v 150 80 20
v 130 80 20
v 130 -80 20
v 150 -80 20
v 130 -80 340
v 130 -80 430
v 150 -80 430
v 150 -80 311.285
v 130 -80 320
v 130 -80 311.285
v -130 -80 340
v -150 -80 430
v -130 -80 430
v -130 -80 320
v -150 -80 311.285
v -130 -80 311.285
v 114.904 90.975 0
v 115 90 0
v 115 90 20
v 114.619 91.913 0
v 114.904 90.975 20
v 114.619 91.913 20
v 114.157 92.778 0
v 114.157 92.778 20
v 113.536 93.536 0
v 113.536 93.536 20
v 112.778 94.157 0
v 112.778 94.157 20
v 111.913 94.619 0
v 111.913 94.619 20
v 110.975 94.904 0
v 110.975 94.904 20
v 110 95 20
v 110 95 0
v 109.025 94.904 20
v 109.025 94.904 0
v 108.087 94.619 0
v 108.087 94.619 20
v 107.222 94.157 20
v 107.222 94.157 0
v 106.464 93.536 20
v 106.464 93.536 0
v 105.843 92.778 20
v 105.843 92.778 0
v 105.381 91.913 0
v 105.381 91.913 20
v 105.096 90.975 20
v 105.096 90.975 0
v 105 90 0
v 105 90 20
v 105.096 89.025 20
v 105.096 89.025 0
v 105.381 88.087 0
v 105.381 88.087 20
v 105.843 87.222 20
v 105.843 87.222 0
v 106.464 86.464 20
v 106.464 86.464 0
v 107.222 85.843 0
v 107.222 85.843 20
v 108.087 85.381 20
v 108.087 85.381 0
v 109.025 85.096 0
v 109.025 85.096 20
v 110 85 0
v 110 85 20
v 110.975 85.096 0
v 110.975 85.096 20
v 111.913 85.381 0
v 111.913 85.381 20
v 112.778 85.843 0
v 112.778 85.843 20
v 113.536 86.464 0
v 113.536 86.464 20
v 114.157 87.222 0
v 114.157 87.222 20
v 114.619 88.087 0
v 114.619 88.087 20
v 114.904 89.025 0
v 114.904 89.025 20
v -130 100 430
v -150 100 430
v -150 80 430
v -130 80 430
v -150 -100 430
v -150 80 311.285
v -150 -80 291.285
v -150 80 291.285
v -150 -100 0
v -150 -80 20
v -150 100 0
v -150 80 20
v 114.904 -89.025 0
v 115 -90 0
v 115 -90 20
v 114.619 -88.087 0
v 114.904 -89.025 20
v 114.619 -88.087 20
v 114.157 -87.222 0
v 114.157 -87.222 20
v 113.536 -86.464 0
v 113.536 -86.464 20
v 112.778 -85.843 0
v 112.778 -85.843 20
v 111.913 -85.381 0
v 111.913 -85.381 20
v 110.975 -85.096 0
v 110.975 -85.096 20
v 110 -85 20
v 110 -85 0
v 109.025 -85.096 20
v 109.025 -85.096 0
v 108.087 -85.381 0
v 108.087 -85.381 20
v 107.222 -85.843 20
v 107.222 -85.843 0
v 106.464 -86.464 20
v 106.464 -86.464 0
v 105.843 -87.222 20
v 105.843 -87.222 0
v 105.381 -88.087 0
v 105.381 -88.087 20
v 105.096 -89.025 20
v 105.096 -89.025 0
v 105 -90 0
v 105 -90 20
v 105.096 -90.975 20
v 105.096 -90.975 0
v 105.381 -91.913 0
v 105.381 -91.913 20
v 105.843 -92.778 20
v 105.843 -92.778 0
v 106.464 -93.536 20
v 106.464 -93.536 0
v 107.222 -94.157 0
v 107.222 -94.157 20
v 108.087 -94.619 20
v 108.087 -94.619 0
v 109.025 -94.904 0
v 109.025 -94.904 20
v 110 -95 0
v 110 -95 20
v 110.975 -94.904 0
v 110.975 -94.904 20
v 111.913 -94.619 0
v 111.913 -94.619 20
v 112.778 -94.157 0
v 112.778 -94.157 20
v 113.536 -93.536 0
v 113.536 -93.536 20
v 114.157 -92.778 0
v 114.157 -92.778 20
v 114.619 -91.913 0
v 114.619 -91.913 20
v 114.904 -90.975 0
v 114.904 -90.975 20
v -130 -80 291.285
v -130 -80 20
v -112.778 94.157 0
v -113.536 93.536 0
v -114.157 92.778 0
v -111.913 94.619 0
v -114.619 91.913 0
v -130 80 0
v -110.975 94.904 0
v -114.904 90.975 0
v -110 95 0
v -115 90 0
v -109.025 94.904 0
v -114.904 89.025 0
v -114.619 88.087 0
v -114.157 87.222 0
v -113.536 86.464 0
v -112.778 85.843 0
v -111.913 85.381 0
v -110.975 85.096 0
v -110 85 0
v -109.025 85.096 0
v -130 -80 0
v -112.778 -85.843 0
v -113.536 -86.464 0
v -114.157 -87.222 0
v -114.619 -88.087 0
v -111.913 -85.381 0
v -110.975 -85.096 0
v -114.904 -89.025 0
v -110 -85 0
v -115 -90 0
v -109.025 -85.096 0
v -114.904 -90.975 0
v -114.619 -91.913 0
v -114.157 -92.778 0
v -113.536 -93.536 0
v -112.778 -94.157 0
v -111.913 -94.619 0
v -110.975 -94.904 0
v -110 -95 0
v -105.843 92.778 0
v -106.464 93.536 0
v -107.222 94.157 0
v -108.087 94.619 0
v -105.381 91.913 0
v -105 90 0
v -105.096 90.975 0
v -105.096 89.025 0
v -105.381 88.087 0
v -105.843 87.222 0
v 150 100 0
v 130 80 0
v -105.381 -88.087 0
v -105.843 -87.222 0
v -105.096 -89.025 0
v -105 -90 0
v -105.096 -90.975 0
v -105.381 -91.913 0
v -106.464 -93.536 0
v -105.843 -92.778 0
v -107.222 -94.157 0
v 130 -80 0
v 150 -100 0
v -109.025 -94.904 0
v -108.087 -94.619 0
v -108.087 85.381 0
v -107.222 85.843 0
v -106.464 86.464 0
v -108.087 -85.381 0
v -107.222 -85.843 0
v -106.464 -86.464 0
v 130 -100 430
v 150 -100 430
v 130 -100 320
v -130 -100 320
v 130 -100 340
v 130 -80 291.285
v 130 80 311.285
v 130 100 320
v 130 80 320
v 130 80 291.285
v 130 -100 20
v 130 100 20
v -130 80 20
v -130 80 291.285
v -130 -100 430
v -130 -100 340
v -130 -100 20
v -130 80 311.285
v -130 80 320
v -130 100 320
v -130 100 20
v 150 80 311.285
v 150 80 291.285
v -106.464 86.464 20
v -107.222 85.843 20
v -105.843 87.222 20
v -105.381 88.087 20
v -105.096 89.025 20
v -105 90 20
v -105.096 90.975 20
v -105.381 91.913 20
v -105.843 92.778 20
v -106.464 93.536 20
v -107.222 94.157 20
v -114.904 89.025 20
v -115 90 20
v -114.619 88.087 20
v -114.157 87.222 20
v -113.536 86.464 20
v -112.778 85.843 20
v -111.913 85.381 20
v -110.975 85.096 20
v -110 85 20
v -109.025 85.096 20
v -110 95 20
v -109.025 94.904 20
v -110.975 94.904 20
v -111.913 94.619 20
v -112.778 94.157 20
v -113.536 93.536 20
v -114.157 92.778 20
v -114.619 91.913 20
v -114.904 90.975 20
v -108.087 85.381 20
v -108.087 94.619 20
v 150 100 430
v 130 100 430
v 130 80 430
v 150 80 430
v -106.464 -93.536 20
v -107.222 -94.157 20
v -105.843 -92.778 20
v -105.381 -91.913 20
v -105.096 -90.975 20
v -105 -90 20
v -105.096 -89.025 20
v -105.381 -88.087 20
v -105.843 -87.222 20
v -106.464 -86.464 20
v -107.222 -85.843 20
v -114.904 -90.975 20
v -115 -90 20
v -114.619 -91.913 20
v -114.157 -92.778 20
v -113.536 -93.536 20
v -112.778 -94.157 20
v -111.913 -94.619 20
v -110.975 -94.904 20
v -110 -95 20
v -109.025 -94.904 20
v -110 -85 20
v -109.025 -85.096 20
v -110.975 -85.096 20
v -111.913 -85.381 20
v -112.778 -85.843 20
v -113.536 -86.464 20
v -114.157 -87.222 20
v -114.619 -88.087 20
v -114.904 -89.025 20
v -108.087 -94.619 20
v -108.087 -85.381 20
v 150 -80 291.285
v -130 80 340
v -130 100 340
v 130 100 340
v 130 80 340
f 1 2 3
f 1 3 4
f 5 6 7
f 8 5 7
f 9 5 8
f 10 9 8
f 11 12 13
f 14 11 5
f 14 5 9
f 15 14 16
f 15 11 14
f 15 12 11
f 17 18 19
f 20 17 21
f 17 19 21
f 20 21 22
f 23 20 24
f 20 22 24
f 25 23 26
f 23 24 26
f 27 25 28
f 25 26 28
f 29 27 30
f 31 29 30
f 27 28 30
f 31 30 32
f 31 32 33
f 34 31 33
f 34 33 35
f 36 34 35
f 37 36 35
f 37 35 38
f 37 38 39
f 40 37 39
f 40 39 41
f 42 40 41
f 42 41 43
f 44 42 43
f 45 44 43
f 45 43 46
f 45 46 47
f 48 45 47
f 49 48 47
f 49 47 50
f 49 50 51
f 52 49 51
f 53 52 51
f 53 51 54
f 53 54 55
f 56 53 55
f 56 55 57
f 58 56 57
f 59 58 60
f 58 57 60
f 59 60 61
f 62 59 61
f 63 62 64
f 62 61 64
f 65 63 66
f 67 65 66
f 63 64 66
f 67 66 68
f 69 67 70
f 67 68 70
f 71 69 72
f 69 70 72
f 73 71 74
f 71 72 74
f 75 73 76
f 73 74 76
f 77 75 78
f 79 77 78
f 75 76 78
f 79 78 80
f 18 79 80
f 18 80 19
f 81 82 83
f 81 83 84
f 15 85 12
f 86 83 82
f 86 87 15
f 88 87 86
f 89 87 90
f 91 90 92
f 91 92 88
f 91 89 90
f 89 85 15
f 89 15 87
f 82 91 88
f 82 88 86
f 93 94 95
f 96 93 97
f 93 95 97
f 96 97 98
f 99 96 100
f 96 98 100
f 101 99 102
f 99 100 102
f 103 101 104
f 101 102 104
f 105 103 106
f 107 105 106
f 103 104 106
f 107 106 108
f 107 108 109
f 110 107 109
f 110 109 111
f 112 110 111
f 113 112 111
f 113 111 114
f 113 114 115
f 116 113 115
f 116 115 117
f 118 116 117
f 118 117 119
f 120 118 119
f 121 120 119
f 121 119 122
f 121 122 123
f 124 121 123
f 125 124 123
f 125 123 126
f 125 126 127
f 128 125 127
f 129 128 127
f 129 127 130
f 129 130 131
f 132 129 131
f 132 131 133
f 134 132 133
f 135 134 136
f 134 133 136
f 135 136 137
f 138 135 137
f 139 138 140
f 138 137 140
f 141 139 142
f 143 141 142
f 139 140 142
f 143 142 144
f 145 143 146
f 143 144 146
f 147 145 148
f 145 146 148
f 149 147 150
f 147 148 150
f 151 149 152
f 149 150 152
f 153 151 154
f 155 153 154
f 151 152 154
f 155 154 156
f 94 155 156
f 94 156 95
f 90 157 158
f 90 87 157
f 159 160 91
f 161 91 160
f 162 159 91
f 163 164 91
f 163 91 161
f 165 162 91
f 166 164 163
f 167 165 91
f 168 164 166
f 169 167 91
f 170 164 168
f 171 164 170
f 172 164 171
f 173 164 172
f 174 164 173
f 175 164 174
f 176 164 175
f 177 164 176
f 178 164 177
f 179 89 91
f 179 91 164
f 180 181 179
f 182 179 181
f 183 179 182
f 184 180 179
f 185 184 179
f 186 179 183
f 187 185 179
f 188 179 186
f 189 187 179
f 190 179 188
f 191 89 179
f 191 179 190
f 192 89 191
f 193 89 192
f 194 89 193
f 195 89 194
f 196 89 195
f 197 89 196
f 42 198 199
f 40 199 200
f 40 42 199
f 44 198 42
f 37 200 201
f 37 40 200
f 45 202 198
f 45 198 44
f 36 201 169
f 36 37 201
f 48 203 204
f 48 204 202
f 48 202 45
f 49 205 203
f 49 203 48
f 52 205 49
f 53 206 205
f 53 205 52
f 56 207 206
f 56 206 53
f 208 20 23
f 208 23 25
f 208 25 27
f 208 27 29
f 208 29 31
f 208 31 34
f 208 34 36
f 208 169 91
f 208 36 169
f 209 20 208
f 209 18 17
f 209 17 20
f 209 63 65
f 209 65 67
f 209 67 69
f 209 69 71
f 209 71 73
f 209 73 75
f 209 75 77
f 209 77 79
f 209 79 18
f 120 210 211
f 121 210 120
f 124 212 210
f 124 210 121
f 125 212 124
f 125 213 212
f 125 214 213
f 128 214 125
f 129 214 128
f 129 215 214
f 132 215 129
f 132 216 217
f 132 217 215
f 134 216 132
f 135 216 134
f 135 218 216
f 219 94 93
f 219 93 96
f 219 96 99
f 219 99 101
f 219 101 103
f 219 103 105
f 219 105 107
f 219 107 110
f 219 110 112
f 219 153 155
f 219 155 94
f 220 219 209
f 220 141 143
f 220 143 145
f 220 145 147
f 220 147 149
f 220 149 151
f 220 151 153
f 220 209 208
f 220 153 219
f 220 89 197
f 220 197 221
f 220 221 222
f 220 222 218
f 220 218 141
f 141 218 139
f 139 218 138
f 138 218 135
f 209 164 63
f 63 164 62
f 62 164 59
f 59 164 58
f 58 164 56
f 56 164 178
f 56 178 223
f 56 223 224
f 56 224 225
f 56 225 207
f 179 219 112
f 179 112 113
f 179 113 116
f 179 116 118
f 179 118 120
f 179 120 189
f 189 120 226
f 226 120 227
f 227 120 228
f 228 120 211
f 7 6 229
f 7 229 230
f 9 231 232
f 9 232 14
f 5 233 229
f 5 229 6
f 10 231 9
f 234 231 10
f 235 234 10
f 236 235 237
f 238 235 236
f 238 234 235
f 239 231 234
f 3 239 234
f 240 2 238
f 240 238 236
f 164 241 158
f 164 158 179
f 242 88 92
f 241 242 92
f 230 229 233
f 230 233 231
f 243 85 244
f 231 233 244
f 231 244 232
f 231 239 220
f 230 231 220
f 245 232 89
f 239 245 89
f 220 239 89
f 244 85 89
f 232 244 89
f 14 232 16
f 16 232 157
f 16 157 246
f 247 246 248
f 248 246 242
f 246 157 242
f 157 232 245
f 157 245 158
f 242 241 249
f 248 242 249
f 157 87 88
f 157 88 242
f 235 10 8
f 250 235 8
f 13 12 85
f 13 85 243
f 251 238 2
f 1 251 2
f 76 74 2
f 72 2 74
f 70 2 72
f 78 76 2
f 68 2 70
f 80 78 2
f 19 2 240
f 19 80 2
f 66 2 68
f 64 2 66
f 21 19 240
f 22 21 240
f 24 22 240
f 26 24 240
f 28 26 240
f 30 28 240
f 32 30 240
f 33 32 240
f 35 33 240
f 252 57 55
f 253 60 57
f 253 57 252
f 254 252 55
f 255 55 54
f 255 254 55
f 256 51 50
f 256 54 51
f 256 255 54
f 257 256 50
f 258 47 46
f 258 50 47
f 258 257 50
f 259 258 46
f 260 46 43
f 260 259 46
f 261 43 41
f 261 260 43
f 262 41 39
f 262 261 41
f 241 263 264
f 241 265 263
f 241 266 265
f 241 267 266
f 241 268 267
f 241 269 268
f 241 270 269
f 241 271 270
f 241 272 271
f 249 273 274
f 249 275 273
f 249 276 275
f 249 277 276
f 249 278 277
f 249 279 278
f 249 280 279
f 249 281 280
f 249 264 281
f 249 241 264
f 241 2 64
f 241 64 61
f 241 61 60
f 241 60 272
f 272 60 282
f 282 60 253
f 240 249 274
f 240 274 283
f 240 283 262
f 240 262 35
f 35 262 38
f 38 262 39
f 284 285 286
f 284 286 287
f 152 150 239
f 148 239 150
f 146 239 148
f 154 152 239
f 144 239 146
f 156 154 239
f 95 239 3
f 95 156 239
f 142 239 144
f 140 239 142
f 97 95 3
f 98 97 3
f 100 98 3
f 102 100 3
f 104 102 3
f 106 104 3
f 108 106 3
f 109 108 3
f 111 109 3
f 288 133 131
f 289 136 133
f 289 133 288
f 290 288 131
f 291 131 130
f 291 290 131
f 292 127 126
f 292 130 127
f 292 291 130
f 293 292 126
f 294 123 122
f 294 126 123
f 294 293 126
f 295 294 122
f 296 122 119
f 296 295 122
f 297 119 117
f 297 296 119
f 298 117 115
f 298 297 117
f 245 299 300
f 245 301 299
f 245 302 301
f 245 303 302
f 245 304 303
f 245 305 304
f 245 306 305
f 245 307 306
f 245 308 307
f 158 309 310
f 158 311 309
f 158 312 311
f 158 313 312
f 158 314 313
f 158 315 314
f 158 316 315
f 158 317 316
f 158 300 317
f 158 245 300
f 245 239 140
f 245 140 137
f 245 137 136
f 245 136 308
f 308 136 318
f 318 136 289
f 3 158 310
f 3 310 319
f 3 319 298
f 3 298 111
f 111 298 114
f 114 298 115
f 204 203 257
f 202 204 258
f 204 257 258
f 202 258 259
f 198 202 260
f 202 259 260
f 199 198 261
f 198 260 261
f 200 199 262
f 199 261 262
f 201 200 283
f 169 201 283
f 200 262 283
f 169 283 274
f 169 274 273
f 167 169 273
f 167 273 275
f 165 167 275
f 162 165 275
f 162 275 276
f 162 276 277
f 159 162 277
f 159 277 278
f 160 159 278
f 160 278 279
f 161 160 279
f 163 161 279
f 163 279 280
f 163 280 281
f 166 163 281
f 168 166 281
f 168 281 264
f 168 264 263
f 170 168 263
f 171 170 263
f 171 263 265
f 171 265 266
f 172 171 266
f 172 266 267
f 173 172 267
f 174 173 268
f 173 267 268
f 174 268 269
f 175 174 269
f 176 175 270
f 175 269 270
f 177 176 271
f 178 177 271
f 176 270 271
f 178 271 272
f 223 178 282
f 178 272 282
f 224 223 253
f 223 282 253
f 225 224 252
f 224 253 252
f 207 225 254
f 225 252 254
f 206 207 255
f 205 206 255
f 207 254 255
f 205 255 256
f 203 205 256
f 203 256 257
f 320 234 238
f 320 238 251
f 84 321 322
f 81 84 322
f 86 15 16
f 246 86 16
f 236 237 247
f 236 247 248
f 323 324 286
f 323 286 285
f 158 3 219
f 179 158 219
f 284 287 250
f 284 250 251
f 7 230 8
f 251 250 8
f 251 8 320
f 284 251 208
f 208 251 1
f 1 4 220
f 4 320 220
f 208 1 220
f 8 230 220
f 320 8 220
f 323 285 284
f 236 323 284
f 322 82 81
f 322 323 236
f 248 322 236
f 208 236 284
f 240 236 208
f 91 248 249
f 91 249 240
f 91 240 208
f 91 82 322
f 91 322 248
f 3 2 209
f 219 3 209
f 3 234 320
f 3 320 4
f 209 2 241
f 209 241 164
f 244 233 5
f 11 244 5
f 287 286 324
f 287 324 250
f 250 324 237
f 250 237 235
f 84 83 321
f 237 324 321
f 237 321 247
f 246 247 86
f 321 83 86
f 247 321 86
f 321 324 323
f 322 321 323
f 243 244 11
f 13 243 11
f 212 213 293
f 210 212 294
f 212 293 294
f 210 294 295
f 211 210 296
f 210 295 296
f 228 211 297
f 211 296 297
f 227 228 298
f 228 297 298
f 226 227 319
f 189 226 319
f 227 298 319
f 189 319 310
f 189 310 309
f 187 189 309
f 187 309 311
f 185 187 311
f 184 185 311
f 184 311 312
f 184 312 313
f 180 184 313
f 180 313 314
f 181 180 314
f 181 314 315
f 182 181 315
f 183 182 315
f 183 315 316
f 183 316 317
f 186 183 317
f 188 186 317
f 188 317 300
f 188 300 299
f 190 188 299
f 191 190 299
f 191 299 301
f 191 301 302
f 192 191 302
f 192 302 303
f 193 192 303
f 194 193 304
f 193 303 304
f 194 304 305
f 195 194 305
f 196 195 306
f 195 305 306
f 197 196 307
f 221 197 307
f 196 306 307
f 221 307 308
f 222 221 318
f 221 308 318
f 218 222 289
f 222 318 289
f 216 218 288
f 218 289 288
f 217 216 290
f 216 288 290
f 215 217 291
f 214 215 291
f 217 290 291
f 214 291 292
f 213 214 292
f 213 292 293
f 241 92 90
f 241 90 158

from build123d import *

# Parameters (mm, degrees)
SKETCH_1_W          = 20
SKETCH_1_H          = 20
EXTRUDE_1_DEPTH     = 430
EXTRUDE_1_2_DEPTH   = 430
EXTRUDE_1_3_DEPTH   = 430
EXTRUDE_1_4_DEPTH   = 430
SKETCH_2_W          = 20
SKETCH_2_H          = 20
EXTRUDE_2_DEPTH     = 260
SKETCH_3_W          = 20
SKETCH_3_H          = 20
EXTRUDE_3_DEPTH     = 160
SKETCH_5_W          = 20
SKETCH_5_H          = 20
EXTRUDE_4_DEPTH     = 261
SKETCH_6_W          = 20
SKETCH_6_H          = 20
EXTRUDE_6_DEPTH     = 160
SKETCH_7_R          = 5
CUT_EXTRUDE_2_DEPTH = 41


with BuildPart() as part:
    # 草图1 → 凸台-拉伸1 (new body)
    with BuildSketch(Plane.XY):
        with Locations((-140, 90)):
            Rectangle(SKETCH_1_W, SKETCH_1_H)
    extrude(amount=EXTRUDE_1_DEPTH)



with BuildPart() as body_2:
    # 草图1 → Extrude 1 2 (new body)
    with BuildSketch(Plane.XY):
        with Locations((-140, -90)):
            Rectangle(SKETCH_1_W, SKETCH_1_H)
    extrude(amount=EXTRUDE_1_2_DEPTH)


with BuildPart() as body_3:
    # 草图1 → Extrude 1 3 (new body)
    with BuildSketch(Plane.XY):
        with Locations((140, -90)):
            Rectangle(SKETCH_1_W, SKETCH_1_H)
    extrude(amount=EXTRUDE_1_3_DEPTH)


with BuildPart() as body_4:
    # 草图1 → Extrude 1 4 (new body)
    with BuildSketch(Plane.XY):
        with Locations((140, 90)):
            Rectangle(SKETCH_1_W, SKETCH_1_H)
    extrude(amount=EXTRUDE_1_4_DEPTH)


with BuildPart() as part_1:
    add(part.part)

    add(body_2.part)  # 凸台-拉伸2 merges body 2

    add(body_3.part)  # 凸台-拉伸2 merges body 3

    add(body_4.part)  # 凸台-拉伸2 merges body 4
    # 草图2 → 凸台-拉伸2 (add)
    with BuildSketch(Plane(origin=(-130, 0, 0), x_dir=(0, 0, -1), z_dir=(1, 0, 0))):
        with Locations((-10, 90)):
            Rectangle(SKETCH_2_W, SKETCH_2_H)
        with Locations((-10, -90)):
            Rectangle(SKETCH_2_W, SKETCH_2_H)
    extrude(amount=EXTRUDE_2_DEPTH)

    # 草图3 → 凸台-拉伸3 (add)
    with BuildSketch(Plane(origin=(0, -80, 0), x_dir=(1, 0, 0), z_dir=(0, 1, 0))):
        with Locations((140, -10)):
            Rectangle(SKETCH_3_W, SKETCH_3_H)
        with Locations((-140, -10)):
            Rectangle(SKETCH_3_W, SKETCH_3_H)
    extrude(amount=EXTRUDE_3_DEPTH)

    # 草图5 → 凸台-拉伸4 (add)
    with BuildSketch(Plane(origin=(-130, 0, 0), x_dir=(0, 0, -1), z_dir=(1, 0, 0))):
        with Locations((-330, 90)):
            Rectangle(SKETCH_5_W, SKETCH_5_H)
        with Locations((-330, -90)):
            Rectangle(SKETCH_5_W, SKETCH_5_H)
    extrude(amount=EXTRUDE_4_DEPTH)

    # 草图6 → 凸台-拉伸6 (add)
    with BuildSketch(Plane.XZ.offset(-80)):
        with Locations((140, 301.284847627)):
            Rectangle(SKETCH_6_W, SKETCH_6_H)
        with Locations((-140, 301.284847627)):
            Rectangle(SKETCH_6_W, SKETCH_6_H)
    extrude(amount=EXTRUDE_6_DEPTH)

    # 草图7 → 切除-拉伸2 (cut)
    with BuildSketch(Plane.XY.offset(20)):
        with Locations((110, 90)):
            Circle(SKETCH_7_R)
        with Locations((110, -90)):
            Circle(SKETCH_7_R)
        with Locations((-110, -90)):
            Circle(SKETCH_7_R)
        with Locations((-110, 90)):
            Circle(SKETCH_7_R)
    extrude(amount=-CUT_EXTRUDE_2_DEPTH, mode=Mode.SUBTRACT)


solid = part_1.part
